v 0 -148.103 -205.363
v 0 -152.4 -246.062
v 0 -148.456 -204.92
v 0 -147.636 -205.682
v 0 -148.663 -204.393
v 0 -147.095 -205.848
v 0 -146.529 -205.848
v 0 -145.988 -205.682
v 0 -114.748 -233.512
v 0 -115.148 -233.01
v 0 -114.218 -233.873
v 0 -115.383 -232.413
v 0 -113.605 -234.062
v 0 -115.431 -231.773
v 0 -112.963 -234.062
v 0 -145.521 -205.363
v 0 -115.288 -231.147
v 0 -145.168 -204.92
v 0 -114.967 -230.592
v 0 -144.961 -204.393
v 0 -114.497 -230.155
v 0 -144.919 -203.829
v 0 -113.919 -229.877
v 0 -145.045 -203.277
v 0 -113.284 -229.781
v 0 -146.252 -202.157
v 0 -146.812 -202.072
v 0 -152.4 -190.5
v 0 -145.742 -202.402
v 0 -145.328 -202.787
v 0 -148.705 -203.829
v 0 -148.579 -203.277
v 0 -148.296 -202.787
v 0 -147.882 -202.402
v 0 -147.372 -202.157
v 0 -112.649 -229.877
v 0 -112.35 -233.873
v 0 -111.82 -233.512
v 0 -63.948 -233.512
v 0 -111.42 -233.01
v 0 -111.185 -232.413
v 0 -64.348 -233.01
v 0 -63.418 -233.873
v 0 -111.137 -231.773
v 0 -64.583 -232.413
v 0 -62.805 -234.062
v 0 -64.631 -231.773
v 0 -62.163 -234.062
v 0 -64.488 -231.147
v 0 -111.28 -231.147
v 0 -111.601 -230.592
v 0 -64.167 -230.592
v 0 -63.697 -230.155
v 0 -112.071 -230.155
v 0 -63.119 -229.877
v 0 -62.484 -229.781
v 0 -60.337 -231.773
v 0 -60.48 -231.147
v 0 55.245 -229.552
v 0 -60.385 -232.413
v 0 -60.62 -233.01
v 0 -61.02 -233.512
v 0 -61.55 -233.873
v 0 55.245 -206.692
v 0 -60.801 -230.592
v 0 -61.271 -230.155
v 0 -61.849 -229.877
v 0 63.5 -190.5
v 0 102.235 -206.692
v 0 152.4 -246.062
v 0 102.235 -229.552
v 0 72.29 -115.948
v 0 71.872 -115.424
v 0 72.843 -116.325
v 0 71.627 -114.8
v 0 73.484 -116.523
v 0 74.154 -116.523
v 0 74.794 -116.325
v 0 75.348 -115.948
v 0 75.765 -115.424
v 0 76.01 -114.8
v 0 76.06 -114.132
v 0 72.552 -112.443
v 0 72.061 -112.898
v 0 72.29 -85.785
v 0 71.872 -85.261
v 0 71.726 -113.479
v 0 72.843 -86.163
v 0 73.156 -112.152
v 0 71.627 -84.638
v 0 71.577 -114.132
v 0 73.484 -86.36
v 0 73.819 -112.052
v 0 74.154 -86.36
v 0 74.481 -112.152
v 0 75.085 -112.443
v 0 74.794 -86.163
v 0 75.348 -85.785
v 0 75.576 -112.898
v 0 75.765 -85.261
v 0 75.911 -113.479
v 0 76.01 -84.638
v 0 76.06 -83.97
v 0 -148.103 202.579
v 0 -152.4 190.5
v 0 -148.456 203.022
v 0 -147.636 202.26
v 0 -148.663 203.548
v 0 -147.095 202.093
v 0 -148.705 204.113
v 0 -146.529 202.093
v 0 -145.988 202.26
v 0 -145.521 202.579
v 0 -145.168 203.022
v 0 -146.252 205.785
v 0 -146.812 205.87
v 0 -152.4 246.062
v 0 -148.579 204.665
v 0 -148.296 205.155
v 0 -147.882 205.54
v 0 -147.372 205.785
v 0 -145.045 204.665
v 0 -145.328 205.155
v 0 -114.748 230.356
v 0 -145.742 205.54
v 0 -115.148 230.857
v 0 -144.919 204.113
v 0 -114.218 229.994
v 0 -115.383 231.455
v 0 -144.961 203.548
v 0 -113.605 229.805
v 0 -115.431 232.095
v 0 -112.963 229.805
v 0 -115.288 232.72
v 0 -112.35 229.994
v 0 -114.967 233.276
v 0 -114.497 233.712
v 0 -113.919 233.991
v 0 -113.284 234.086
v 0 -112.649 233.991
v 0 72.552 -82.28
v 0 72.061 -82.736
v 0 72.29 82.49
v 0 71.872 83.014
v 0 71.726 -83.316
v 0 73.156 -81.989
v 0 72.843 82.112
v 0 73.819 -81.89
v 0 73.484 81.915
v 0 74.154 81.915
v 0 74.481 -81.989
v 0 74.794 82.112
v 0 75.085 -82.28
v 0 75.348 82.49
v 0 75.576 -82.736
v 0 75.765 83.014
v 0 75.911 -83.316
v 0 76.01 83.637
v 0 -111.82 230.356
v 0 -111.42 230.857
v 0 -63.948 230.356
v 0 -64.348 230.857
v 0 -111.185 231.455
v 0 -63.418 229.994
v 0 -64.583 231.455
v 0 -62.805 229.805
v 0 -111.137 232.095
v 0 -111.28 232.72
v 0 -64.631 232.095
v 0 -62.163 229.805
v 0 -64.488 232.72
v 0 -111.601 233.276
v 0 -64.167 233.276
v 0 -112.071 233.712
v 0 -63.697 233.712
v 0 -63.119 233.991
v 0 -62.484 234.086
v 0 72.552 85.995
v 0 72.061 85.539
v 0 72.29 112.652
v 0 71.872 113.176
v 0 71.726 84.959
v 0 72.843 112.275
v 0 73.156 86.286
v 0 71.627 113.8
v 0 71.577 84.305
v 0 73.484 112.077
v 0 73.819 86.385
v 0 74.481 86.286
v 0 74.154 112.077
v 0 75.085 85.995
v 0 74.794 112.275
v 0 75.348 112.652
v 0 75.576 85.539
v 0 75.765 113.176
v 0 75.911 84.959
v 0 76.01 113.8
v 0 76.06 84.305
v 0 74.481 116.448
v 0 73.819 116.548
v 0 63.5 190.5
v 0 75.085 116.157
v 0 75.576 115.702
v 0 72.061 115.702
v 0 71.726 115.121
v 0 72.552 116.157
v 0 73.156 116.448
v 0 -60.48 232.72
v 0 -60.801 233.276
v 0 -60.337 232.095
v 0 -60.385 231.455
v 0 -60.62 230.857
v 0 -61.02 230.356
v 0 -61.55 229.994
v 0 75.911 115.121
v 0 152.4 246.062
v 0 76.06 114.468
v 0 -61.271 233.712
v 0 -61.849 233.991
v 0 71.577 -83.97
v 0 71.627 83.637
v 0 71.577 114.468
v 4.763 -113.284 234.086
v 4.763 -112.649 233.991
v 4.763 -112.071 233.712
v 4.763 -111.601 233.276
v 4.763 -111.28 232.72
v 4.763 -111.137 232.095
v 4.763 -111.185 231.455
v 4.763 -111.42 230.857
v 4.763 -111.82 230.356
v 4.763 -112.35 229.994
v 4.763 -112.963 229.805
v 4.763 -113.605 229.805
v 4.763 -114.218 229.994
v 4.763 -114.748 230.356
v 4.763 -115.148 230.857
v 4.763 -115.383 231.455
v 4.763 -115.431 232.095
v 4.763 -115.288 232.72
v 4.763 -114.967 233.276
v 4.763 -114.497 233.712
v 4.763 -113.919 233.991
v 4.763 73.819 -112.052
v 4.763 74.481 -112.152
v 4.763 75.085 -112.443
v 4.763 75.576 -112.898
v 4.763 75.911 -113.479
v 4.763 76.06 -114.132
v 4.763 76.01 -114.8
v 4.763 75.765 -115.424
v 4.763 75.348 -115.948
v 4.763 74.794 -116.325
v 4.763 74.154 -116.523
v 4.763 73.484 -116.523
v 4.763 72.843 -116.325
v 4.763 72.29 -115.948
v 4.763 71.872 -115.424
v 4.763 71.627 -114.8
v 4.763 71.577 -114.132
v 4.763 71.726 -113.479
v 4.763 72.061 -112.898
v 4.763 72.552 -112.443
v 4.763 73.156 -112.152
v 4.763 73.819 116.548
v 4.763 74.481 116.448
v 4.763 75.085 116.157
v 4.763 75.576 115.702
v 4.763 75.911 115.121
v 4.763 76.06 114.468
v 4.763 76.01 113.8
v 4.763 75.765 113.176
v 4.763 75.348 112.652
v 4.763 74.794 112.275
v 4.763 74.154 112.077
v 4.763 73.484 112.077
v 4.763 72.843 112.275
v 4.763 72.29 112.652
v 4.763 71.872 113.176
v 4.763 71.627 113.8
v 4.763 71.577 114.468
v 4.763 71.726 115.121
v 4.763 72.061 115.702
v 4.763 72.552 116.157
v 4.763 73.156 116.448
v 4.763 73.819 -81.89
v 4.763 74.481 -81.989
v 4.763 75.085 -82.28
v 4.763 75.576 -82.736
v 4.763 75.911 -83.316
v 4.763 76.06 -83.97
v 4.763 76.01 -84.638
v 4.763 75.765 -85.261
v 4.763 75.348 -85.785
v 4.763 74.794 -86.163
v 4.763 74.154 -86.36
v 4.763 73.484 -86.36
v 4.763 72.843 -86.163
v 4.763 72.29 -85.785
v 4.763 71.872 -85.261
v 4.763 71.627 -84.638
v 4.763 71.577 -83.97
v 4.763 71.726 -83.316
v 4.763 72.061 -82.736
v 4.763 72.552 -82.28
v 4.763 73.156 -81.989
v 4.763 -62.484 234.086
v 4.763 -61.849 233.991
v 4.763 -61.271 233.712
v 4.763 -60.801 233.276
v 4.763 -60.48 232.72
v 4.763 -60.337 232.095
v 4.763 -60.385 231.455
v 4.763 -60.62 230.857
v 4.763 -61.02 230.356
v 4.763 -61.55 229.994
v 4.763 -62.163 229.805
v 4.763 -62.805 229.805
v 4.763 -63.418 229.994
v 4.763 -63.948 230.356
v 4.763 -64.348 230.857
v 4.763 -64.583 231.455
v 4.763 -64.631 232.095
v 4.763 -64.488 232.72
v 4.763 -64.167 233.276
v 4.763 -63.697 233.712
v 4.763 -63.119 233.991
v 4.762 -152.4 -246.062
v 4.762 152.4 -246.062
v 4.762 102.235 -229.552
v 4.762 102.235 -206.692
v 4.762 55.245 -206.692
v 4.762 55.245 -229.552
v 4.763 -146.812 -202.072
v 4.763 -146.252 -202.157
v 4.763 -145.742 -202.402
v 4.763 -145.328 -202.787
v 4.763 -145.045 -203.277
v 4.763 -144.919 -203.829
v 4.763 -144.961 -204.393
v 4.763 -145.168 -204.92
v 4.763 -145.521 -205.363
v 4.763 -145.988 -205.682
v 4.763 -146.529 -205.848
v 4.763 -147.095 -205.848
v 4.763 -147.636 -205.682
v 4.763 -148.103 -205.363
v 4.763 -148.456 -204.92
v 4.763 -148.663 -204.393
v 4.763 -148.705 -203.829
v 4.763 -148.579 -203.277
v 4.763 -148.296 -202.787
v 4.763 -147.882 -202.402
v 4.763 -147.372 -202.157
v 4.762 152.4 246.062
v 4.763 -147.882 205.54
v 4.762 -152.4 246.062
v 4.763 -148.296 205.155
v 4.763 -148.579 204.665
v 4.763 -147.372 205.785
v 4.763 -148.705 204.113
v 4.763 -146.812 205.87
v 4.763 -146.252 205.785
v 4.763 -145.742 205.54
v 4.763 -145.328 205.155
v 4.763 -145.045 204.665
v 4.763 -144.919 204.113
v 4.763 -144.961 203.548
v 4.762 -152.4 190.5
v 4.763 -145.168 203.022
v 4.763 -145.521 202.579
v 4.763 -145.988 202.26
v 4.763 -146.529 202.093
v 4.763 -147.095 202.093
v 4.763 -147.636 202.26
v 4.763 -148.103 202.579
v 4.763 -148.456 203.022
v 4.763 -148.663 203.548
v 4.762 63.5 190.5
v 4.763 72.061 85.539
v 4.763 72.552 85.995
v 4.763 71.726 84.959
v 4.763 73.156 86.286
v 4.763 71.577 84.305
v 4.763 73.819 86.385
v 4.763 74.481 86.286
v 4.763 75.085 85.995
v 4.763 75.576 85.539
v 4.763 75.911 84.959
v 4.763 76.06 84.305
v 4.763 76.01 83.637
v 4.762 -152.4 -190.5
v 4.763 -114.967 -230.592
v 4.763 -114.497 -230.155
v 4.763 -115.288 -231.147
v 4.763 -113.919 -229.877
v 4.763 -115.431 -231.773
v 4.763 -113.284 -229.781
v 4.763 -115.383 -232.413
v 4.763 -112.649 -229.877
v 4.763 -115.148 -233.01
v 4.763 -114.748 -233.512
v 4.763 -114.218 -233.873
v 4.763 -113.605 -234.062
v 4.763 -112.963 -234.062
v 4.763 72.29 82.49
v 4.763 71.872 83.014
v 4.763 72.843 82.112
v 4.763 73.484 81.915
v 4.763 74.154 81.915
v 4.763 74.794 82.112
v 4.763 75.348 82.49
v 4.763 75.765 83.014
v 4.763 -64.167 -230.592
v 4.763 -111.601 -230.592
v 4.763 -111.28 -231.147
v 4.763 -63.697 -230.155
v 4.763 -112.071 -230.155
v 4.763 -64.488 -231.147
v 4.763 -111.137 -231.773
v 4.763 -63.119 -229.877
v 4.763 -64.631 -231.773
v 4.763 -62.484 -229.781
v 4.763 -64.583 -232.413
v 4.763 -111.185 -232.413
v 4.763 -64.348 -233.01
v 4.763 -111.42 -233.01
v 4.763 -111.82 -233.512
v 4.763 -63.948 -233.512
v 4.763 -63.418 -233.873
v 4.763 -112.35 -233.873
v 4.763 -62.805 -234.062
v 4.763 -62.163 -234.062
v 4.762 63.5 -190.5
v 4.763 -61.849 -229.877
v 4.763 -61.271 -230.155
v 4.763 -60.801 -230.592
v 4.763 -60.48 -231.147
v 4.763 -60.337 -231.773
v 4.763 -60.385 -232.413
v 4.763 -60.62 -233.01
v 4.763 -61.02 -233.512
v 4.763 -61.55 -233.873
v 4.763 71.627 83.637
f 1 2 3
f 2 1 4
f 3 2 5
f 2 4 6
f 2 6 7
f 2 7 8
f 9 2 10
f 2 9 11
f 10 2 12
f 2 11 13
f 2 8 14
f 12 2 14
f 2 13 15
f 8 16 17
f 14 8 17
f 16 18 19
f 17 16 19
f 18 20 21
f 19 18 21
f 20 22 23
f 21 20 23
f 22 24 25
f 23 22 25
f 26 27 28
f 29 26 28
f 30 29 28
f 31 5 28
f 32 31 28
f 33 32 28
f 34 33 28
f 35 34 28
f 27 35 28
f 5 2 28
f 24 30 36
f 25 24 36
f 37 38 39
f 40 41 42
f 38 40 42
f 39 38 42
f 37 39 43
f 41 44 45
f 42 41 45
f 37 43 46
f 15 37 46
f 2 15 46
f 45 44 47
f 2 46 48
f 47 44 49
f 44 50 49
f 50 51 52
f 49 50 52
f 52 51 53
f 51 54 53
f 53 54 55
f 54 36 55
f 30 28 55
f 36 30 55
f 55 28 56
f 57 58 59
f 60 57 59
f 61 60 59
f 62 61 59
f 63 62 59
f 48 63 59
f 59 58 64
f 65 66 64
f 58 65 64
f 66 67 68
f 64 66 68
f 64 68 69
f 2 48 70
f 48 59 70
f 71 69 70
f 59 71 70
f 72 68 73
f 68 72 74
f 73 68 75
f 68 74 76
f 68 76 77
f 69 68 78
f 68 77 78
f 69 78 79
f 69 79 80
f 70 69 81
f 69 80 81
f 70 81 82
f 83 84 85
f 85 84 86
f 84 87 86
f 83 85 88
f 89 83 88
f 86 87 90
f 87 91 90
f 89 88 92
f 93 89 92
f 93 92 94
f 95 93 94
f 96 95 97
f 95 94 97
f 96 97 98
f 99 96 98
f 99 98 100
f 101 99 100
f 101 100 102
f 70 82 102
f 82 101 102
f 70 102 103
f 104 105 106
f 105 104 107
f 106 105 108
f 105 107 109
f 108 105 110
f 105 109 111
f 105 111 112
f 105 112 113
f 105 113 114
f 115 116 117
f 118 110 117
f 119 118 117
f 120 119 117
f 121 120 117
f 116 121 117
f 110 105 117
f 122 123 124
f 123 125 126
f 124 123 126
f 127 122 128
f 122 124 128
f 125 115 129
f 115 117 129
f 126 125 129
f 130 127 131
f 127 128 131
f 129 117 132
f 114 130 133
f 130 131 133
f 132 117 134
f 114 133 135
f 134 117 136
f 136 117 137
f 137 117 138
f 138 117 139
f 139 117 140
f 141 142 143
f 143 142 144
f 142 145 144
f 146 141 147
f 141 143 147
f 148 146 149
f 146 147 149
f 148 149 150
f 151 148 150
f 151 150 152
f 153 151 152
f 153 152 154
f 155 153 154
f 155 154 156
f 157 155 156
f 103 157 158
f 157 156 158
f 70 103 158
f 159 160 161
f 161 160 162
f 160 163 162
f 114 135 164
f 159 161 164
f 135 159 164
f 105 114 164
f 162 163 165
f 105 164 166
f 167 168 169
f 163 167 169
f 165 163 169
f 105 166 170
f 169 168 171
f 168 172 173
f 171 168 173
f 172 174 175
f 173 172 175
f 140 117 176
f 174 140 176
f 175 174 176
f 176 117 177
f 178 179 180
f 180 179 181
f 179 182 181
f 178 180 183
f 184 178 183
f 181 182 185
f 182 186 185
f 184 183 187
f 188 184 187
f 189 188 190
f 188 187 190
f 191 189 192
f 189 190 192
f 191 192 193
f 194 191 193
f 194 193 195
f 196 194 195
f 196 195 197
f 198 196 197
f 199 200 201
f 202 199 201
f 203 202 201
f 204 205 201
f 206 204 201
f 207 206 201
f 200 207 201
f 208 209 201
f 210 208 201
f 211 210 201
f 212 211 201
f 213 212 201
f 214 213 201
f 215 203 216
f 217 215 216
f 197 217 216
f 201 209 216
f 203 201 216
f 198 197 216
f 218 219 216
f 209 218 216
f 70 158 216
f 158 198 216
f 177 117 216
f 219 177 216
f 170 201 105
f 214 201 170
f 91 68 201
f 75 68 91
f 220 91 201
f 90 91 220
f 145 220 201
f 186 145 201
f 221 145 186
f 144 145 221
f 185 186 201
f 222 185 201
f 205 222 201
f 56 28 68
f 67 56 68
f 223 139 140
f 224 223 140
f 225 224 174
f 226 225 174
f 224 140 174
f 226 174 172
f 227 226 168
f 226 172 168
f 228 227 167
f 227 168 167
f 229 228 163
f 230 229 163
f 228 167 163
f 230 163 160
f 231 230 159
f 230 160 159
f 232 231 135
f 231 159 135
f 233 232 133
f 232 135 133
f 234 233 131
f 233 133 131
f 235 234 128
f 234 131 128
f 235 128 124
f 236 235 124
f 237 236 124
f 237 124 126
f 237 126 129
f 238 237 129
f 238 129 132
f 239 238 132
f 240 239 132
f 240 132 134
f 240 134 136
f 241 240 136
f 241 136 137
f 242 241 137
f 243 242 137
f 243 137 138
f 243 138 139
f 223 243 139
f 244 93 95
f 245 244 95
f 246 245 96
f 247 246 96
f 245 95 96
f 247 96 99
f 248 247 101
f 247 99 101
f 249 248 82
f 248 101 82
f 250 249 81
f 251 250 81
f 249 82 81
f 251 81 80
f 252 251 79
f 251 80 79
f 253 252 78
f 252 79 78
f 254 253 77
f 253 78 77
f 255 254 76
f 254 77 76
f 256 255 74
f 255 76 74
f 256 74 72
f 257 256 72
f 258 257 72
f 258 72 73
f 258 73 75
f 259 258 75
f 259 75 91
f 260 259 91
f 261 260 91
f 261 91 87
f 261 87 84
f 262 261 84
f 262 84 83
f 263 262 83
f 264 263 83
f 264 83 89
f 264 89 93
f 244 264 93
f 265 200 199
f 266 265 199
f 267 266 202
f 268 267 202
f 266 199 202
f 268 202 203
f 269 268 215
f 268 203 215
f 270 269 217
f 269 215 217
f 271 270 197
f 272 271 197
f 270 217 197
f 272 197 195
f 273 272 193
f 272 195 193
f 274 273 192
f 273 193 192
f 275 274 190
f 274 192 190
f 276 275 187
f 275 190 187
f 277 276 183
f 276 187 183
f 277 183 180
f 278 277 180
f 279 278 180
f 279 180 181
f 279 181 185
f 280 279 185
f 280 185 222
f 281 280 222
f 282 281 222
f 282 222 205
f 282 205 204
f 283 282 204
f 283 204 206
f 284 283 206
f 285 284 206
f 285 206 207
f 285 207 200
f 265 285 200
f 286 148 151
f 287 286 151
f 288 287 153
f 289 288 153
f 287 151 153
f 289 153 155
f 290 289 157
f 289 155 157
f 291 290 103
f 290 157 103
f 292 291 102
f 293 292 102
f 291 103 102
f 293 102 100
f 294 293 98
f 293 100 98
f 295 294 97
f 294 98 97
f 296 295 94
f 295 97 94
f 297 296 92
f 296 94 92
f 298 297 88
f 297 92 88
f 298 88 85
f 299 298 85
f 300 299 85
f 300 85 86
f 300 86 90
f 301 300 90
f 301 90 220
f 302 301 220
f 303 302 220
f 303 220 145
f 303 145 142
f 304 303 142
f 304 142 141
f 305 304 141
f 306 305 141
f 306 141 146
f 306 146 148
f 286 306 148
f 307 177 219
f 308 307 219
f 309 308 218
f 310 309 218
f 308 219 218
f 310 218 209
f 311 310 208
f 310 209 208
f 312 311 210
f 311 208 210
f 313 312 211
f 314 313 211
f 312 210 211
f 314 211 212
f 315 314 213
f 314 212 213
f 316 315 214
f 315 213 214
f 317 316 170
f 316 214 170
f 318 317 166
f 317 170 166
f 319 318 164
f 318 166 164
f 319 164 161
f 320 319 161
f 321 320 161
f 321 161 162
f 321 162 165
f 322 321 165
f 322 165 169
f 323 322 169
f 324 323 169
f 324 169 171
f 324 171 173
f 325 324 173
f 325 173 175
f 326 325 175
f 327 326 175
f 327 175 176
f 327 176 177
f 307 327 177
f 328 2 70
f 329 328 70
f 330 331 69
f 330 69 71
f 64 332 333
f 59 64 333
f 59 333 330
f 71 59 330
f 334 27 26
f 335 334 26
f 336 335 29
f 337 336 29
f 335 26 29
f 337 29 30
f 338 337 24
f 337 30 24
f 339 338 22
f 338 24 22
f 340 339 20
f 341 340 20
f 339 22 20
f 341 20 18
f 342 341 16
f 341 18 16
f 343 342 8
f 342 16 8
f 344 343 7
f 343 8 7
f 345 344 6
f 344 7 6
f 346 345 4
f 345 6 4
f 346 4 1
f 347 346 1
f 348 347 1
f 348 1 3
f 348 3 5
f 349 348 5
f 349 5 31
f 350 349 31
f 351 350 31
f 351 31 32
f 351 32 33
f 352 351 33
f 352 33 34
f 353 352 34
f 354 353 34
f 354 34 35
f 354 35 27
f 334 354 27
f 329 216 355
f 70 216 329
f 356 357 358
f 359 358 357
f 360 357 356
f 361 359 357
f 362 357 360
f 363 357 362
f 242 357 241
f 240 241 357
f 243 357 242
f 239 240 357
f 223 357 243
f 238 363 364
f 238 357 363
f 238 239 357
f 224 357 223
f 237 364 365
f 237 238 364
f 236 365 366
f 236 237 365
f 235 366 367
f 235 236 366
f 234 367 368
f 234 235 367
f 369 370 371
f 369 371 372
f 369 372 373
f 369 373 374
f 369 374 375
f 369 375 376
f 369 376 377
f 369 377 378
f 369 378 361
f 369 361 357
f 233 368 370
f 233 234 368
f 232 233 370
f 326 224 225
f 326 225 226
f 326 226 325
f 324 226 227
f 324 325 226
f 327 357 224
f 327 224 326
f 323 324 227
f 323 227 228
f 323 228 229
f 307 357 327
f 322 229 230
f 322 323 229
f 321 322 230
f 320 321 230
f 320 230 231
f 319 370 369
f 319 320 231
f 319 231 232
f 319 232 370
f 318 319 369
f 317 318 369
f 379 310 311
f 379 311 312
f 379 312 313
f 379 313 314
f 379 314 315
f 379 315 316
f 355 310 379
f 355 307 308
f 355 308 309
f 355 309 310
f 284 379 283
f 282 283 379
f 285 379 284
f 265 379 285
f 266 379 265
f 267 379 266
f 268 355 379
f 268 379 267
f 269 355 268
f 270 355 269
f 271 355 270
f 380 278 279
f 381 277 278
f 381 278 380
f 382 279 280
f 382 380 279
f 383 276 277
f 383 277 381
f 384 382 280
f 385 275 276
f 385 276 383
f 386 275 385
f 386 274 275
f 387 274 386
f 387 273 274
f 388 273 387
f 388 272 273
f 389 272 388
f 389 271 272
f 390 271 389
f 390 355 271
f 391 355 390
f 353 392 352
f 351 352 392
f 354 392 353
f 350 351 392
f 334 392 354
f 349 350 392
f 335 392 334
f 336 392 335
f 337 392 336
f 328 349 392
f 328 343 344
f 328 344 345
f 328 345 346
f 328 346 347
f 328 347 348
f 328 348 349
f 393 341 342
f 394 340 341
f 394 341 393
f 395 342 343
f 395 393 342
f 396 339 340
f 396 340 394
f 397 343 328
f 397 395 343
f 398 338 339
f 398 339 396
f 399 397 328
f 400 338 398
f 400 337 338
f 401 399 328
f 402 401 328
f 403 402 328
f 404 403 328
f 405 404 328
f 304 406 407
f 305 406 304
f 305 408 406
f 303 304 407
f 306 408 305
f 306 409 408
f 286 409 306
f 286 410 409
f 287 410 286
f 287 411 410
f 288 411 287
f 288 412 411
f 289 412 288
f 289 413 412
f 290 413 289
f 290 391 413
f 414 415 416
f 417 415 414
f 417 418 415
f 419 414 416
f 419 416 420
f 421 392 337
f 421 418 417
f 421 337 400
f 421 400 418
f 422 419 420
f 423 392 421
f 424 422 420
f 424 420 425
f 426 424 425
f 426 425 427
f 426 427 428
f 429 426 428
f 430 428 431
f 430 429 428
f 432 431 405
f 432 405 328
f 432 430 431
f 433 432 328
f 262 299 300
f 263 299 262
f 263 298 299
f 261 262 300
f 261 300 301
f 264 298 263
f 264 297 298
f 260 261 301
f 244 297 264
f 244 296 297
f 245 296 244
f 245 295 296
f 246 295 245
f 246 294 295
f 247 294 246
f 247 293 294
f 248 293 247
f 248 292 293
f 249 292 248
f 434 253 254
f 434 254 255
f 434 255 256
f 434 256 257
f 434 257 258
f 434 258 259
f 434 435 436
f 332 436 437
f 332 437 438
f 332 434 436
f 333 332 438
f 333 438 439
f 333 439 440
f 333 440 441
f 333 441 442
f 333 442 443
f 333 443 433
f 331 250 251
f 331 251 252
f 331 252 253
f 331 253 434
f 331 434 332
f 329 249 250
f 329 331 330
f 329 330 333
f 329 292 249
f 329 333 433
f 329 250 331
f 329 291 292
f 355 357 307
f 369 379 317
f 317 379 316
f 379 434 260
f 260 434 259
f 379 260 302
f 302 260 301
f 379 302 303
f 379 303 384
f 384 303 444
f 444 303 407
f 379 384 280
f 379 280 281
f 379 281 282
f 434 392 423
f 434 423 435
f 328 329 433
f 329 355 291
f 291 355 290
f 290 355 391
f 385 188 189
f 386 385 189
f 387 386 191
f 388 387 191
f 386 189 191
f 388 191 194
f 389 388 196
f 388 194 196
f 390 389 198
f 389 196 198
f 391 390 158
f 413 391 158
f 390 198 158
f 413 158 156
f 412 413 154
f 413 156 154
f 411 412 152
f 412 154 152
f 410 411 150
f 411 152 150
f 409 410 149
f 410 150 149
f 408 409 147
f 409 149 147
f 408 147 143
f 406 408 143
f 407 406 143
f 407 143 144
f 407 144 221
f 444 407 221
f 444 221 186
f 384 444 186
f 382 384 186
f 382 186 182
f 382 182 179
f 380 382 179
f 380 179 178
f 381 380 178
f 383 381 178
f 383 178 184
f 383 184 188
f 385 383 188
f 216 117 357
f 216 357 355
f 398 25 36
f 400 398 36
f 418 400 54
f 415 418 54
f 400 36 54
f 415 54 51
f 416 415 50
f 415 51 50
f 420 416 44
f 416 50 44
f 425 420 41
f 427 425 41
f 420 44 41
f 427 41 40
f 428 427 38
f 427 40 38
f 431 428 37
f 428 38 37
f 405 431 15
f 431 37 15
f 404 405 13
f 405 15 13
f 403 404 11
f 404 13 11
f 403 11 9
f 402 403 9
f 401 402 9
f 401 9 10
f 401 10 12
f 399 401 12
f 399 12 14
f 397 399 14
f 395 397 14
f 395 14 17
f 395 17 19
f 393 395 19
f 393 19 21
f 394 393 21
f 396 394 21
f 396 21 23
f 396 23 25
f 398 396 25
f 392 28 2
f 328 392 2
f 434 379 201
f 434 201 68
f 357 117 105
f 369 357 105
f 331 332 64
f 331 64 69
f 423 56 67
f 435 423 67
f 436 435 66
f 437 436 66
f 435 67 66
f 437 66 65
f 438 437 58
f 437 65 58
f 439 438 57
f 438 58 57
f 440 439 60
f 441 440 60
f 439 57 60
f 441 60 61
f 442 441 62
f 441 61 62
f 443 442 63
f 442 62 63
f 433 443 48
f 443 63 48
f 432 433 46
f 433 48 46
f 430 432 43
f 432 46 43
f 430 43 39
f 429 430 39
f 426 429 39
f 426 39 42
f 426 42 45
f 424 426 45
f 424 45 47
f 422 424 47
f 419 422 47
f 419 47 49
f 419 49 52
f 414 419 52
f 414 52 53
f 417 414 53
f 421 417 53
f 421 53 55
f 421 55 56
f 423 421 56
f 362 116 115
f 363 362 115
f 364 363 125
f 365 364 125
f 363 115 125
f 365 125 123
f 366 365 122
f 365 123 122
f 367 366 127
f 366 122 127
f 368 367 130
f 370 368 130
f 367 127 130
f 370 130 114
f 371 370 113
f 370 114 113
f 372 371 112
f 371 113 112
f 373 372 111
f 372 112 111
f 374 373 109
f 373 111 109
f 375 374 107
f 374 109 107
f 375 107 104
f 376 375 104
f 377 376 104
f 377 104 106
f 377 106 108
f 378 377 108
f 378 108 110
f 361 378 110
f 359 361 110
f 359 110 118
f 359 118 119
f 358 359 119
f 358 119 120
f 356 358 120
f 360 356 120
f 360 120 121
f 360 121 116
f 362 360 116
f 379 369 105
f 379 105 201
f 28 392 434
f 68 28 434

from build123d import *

# Parameters (mm, degrees)
SKETCH1_W                 = 492.125
SKETCH1_H                 = 304.8
BOSS_EXTRUDE1_DEPTH       = 4.7625
CUT_EXTRUDE1_REACH        = 6.763
BOSS_EXTRUDE2_REACH       = 494.125
SKETCH3_W                 = 4.7625
SKETCH3_H                 = 304.8
F_8_CLEARANCE_HOLE1_D     = 4.3053
F_8_CLEARANCE_HOLE1_DEPTH = 74.422
F_8_CLEARANCE_HOLE1_TIP   = 1.293442612
SKETCH9_W                 = 381
SKETCH9_H                 = 215.9
CUT_EXTRUDE2_DEPTH        = 5.7625
F_8_CLEARANCE_HOLE2_D     = 4.4958
F_8_CLEARANCE_HOLE2_DEPTH = 74.422
F_8_CLEARANCE_HOLE2_TIP   = 1.350674586
F_6_CLEARANCE_HOLE1_D     = 3.7973
F_6_CLEARANCE_HOLE1_DEPTH = 74.422
F_6_CLEARANCE_HOLE1_TIP   = 1.140824014
SKETCH14_W                = 22.86
SKETCH14_H                = 46.99
CUT_EXTRUDE3_DEPTH        = 46.736


with BuildPart() as part:
    # Sketch1 → Boss-Extrude1 (new body)
    with BuildSketch(Plane(origin=(0, 0, 0), x_dir=(0, 0, -1), z_dir=(1, 0, 0))):
        Rectangle(SKETCH1_W, SKETCH1_H)
    extrude(amount=BOSS_EXTRUDE1_DEPTH)

    # Sketch2 → Cut-Extrude1 (cut, up to next)
    with BuildSketch(Plane(origin=(4.7625, 0, 0), x_dir=(0, 0, -1), z_dir=(1, 0, 0)), mode=Mode.PRIVATE) as cut_extrude1_sk1:
        Polygon((-24.852813742, -60), (24.852813742, -60), (42.426406871, -42.426406871), (60, -24.852813742), (60, 24.852813742), (24.852813742, 60), (-24.852813742, 60), (-60, 24.852813742), (-60, -24.852813742), align=None)
    cut_extrude1_tool1 = extrude(cut_extrude1_sk1.sketch, amount=-CUT_EXTRUDE1_REACH, mode=Mode.PRIVATE) & part.part
    add(cut_extrude1_tool1.solids().sort_by_distance((4.7625, 0, 0))[0], mode=Mode.SUBTRACT)

    # Sketch3 → Boss-Extrude2 (add, up to next)
    with BuildSketch(Plane.XY.offset(246.0625), mode=Mode.PRIVATE) as boss_extrude2_sk1:
        with Locations((2.38125, 0)):
            Rectangle(SKETCH3_W, SKETCH3_H)
    boss_extrude2_tool1 = extrude(boss_extrude2_sk1.sketch, amount=-BOSS_EXTRUDE2_REACH, mode=Mode.PRIVATE) - part.part
    add(boss_extrude2_tool1.solids().sort_by_distance((2.38125, 0, 246.0625))[0])

    # #8 Clearance Hole1
    with Locations(Plane(origin=(4.7625, 0, 0), x_dir=(0, 0, -1), z_dir=(1, 0, 0))):
        with Locations((-231.93375, -113.284), (-231.93375, -62.484), (231.93375, -62.484), (231.93375, -113.284)):
            Hole(F_8_CLEARANCE_HOLE1_D / 2, depth=F_8_CLEARANCE_HOLE1_DEPTH)
            with Locations((0, 0, -(F_8_CLEARANCE_HOLE1_DEPTH + F_8_CLEARANCE_HOLE1_TIP / 2))):  # 118° drill point
                Cone(0, F_8_CLEARANCE_HOLE1_D / 2, F_8_CLEARANCE_HOLE1_TIP, mode=Mode.SUBTRACT)

    # Sketch9 → Cut-Extrude2 (cut, through all)
    with BuildSketch(Plane(origin=(4.7625, 0, 0), x_dir=(0, 0, -1), z_dir=(1, 0, 0))):
        with Locations((0, -44.45)):
            Rectangle(SKETCH9_W, SKETCH9_H)
    extrude(amount=-CUT_EXTRUDE2_DEPTH, mode=Mode.SUBTRACT)

    # #8 Clearance Hole2
    with Locations(Plane(origin=(4.7625, 0, 0), x_dir=(0, 0, -1), z_dir=(1, 0, 0))):
        with Locations((-114.3, 73.81875), (-84.1375, 73.81875), (84.1375, 73.81875), (114.3, 73.81875)):
            Hole(F_8_CLEARANCE_HOLE2_D / 2, depth=F_8_CLEARANCE_HOLE2_DEPTH)
            with Locations((0, 0, -(F_8_CLEARANCE_HOLE2_DEPTH + F_8_CLEARANCE_HOLE2_TIP / 2))):  # 118° drill point
                Cone(0, F_8_CLEARANCE_HOLE2_D / 2, F_8_CLEARANCE_HOLE2_TIP, mode=Mode.SUBTRACT)

    # #6 Clearance Hole1
    with Locations(Plane(origin=(4.7625, 0, 0), x_dir=(0, 0, -1), z_dir=(1, 0, 0))):
        with Locations((-203.97089, -146.812), (203.97089, -146.812)):
            Hole(F_6_CLEARANCE_HOLE1_D / 2, depth=F_6_CLEARANCE_HOLE1_DEPTH)
            with Locations((0, 0, -(F_6_CLEARANCE_HOLE1_DEPTH + F_6_CLEARANCE_HOLE1_TIP / 2))):  # 118° drill point
                Cone(0, F_6_CLEARANCE_HOLE1_D / 2, F_6_CLEARANCE_HOLE1_TIP, mode=Mode.SUBTRACT)

    # Sketch14 → Cut-Extrude3 (cut)
    with BuildSketch(Plane(origin=(4.7625, 0, 0), x_dir=(0, 0, -1), z_dir=(1, 0, 0))):
        with Locations((218.1225, 78.74)):
            Rectangle(SKETCH14_W, SKETCH14_H)
    extrude(amount=-CUT_EXTRUDE3_DEPTH, mode=Mode.SUBTRACT)


solid = part.part
